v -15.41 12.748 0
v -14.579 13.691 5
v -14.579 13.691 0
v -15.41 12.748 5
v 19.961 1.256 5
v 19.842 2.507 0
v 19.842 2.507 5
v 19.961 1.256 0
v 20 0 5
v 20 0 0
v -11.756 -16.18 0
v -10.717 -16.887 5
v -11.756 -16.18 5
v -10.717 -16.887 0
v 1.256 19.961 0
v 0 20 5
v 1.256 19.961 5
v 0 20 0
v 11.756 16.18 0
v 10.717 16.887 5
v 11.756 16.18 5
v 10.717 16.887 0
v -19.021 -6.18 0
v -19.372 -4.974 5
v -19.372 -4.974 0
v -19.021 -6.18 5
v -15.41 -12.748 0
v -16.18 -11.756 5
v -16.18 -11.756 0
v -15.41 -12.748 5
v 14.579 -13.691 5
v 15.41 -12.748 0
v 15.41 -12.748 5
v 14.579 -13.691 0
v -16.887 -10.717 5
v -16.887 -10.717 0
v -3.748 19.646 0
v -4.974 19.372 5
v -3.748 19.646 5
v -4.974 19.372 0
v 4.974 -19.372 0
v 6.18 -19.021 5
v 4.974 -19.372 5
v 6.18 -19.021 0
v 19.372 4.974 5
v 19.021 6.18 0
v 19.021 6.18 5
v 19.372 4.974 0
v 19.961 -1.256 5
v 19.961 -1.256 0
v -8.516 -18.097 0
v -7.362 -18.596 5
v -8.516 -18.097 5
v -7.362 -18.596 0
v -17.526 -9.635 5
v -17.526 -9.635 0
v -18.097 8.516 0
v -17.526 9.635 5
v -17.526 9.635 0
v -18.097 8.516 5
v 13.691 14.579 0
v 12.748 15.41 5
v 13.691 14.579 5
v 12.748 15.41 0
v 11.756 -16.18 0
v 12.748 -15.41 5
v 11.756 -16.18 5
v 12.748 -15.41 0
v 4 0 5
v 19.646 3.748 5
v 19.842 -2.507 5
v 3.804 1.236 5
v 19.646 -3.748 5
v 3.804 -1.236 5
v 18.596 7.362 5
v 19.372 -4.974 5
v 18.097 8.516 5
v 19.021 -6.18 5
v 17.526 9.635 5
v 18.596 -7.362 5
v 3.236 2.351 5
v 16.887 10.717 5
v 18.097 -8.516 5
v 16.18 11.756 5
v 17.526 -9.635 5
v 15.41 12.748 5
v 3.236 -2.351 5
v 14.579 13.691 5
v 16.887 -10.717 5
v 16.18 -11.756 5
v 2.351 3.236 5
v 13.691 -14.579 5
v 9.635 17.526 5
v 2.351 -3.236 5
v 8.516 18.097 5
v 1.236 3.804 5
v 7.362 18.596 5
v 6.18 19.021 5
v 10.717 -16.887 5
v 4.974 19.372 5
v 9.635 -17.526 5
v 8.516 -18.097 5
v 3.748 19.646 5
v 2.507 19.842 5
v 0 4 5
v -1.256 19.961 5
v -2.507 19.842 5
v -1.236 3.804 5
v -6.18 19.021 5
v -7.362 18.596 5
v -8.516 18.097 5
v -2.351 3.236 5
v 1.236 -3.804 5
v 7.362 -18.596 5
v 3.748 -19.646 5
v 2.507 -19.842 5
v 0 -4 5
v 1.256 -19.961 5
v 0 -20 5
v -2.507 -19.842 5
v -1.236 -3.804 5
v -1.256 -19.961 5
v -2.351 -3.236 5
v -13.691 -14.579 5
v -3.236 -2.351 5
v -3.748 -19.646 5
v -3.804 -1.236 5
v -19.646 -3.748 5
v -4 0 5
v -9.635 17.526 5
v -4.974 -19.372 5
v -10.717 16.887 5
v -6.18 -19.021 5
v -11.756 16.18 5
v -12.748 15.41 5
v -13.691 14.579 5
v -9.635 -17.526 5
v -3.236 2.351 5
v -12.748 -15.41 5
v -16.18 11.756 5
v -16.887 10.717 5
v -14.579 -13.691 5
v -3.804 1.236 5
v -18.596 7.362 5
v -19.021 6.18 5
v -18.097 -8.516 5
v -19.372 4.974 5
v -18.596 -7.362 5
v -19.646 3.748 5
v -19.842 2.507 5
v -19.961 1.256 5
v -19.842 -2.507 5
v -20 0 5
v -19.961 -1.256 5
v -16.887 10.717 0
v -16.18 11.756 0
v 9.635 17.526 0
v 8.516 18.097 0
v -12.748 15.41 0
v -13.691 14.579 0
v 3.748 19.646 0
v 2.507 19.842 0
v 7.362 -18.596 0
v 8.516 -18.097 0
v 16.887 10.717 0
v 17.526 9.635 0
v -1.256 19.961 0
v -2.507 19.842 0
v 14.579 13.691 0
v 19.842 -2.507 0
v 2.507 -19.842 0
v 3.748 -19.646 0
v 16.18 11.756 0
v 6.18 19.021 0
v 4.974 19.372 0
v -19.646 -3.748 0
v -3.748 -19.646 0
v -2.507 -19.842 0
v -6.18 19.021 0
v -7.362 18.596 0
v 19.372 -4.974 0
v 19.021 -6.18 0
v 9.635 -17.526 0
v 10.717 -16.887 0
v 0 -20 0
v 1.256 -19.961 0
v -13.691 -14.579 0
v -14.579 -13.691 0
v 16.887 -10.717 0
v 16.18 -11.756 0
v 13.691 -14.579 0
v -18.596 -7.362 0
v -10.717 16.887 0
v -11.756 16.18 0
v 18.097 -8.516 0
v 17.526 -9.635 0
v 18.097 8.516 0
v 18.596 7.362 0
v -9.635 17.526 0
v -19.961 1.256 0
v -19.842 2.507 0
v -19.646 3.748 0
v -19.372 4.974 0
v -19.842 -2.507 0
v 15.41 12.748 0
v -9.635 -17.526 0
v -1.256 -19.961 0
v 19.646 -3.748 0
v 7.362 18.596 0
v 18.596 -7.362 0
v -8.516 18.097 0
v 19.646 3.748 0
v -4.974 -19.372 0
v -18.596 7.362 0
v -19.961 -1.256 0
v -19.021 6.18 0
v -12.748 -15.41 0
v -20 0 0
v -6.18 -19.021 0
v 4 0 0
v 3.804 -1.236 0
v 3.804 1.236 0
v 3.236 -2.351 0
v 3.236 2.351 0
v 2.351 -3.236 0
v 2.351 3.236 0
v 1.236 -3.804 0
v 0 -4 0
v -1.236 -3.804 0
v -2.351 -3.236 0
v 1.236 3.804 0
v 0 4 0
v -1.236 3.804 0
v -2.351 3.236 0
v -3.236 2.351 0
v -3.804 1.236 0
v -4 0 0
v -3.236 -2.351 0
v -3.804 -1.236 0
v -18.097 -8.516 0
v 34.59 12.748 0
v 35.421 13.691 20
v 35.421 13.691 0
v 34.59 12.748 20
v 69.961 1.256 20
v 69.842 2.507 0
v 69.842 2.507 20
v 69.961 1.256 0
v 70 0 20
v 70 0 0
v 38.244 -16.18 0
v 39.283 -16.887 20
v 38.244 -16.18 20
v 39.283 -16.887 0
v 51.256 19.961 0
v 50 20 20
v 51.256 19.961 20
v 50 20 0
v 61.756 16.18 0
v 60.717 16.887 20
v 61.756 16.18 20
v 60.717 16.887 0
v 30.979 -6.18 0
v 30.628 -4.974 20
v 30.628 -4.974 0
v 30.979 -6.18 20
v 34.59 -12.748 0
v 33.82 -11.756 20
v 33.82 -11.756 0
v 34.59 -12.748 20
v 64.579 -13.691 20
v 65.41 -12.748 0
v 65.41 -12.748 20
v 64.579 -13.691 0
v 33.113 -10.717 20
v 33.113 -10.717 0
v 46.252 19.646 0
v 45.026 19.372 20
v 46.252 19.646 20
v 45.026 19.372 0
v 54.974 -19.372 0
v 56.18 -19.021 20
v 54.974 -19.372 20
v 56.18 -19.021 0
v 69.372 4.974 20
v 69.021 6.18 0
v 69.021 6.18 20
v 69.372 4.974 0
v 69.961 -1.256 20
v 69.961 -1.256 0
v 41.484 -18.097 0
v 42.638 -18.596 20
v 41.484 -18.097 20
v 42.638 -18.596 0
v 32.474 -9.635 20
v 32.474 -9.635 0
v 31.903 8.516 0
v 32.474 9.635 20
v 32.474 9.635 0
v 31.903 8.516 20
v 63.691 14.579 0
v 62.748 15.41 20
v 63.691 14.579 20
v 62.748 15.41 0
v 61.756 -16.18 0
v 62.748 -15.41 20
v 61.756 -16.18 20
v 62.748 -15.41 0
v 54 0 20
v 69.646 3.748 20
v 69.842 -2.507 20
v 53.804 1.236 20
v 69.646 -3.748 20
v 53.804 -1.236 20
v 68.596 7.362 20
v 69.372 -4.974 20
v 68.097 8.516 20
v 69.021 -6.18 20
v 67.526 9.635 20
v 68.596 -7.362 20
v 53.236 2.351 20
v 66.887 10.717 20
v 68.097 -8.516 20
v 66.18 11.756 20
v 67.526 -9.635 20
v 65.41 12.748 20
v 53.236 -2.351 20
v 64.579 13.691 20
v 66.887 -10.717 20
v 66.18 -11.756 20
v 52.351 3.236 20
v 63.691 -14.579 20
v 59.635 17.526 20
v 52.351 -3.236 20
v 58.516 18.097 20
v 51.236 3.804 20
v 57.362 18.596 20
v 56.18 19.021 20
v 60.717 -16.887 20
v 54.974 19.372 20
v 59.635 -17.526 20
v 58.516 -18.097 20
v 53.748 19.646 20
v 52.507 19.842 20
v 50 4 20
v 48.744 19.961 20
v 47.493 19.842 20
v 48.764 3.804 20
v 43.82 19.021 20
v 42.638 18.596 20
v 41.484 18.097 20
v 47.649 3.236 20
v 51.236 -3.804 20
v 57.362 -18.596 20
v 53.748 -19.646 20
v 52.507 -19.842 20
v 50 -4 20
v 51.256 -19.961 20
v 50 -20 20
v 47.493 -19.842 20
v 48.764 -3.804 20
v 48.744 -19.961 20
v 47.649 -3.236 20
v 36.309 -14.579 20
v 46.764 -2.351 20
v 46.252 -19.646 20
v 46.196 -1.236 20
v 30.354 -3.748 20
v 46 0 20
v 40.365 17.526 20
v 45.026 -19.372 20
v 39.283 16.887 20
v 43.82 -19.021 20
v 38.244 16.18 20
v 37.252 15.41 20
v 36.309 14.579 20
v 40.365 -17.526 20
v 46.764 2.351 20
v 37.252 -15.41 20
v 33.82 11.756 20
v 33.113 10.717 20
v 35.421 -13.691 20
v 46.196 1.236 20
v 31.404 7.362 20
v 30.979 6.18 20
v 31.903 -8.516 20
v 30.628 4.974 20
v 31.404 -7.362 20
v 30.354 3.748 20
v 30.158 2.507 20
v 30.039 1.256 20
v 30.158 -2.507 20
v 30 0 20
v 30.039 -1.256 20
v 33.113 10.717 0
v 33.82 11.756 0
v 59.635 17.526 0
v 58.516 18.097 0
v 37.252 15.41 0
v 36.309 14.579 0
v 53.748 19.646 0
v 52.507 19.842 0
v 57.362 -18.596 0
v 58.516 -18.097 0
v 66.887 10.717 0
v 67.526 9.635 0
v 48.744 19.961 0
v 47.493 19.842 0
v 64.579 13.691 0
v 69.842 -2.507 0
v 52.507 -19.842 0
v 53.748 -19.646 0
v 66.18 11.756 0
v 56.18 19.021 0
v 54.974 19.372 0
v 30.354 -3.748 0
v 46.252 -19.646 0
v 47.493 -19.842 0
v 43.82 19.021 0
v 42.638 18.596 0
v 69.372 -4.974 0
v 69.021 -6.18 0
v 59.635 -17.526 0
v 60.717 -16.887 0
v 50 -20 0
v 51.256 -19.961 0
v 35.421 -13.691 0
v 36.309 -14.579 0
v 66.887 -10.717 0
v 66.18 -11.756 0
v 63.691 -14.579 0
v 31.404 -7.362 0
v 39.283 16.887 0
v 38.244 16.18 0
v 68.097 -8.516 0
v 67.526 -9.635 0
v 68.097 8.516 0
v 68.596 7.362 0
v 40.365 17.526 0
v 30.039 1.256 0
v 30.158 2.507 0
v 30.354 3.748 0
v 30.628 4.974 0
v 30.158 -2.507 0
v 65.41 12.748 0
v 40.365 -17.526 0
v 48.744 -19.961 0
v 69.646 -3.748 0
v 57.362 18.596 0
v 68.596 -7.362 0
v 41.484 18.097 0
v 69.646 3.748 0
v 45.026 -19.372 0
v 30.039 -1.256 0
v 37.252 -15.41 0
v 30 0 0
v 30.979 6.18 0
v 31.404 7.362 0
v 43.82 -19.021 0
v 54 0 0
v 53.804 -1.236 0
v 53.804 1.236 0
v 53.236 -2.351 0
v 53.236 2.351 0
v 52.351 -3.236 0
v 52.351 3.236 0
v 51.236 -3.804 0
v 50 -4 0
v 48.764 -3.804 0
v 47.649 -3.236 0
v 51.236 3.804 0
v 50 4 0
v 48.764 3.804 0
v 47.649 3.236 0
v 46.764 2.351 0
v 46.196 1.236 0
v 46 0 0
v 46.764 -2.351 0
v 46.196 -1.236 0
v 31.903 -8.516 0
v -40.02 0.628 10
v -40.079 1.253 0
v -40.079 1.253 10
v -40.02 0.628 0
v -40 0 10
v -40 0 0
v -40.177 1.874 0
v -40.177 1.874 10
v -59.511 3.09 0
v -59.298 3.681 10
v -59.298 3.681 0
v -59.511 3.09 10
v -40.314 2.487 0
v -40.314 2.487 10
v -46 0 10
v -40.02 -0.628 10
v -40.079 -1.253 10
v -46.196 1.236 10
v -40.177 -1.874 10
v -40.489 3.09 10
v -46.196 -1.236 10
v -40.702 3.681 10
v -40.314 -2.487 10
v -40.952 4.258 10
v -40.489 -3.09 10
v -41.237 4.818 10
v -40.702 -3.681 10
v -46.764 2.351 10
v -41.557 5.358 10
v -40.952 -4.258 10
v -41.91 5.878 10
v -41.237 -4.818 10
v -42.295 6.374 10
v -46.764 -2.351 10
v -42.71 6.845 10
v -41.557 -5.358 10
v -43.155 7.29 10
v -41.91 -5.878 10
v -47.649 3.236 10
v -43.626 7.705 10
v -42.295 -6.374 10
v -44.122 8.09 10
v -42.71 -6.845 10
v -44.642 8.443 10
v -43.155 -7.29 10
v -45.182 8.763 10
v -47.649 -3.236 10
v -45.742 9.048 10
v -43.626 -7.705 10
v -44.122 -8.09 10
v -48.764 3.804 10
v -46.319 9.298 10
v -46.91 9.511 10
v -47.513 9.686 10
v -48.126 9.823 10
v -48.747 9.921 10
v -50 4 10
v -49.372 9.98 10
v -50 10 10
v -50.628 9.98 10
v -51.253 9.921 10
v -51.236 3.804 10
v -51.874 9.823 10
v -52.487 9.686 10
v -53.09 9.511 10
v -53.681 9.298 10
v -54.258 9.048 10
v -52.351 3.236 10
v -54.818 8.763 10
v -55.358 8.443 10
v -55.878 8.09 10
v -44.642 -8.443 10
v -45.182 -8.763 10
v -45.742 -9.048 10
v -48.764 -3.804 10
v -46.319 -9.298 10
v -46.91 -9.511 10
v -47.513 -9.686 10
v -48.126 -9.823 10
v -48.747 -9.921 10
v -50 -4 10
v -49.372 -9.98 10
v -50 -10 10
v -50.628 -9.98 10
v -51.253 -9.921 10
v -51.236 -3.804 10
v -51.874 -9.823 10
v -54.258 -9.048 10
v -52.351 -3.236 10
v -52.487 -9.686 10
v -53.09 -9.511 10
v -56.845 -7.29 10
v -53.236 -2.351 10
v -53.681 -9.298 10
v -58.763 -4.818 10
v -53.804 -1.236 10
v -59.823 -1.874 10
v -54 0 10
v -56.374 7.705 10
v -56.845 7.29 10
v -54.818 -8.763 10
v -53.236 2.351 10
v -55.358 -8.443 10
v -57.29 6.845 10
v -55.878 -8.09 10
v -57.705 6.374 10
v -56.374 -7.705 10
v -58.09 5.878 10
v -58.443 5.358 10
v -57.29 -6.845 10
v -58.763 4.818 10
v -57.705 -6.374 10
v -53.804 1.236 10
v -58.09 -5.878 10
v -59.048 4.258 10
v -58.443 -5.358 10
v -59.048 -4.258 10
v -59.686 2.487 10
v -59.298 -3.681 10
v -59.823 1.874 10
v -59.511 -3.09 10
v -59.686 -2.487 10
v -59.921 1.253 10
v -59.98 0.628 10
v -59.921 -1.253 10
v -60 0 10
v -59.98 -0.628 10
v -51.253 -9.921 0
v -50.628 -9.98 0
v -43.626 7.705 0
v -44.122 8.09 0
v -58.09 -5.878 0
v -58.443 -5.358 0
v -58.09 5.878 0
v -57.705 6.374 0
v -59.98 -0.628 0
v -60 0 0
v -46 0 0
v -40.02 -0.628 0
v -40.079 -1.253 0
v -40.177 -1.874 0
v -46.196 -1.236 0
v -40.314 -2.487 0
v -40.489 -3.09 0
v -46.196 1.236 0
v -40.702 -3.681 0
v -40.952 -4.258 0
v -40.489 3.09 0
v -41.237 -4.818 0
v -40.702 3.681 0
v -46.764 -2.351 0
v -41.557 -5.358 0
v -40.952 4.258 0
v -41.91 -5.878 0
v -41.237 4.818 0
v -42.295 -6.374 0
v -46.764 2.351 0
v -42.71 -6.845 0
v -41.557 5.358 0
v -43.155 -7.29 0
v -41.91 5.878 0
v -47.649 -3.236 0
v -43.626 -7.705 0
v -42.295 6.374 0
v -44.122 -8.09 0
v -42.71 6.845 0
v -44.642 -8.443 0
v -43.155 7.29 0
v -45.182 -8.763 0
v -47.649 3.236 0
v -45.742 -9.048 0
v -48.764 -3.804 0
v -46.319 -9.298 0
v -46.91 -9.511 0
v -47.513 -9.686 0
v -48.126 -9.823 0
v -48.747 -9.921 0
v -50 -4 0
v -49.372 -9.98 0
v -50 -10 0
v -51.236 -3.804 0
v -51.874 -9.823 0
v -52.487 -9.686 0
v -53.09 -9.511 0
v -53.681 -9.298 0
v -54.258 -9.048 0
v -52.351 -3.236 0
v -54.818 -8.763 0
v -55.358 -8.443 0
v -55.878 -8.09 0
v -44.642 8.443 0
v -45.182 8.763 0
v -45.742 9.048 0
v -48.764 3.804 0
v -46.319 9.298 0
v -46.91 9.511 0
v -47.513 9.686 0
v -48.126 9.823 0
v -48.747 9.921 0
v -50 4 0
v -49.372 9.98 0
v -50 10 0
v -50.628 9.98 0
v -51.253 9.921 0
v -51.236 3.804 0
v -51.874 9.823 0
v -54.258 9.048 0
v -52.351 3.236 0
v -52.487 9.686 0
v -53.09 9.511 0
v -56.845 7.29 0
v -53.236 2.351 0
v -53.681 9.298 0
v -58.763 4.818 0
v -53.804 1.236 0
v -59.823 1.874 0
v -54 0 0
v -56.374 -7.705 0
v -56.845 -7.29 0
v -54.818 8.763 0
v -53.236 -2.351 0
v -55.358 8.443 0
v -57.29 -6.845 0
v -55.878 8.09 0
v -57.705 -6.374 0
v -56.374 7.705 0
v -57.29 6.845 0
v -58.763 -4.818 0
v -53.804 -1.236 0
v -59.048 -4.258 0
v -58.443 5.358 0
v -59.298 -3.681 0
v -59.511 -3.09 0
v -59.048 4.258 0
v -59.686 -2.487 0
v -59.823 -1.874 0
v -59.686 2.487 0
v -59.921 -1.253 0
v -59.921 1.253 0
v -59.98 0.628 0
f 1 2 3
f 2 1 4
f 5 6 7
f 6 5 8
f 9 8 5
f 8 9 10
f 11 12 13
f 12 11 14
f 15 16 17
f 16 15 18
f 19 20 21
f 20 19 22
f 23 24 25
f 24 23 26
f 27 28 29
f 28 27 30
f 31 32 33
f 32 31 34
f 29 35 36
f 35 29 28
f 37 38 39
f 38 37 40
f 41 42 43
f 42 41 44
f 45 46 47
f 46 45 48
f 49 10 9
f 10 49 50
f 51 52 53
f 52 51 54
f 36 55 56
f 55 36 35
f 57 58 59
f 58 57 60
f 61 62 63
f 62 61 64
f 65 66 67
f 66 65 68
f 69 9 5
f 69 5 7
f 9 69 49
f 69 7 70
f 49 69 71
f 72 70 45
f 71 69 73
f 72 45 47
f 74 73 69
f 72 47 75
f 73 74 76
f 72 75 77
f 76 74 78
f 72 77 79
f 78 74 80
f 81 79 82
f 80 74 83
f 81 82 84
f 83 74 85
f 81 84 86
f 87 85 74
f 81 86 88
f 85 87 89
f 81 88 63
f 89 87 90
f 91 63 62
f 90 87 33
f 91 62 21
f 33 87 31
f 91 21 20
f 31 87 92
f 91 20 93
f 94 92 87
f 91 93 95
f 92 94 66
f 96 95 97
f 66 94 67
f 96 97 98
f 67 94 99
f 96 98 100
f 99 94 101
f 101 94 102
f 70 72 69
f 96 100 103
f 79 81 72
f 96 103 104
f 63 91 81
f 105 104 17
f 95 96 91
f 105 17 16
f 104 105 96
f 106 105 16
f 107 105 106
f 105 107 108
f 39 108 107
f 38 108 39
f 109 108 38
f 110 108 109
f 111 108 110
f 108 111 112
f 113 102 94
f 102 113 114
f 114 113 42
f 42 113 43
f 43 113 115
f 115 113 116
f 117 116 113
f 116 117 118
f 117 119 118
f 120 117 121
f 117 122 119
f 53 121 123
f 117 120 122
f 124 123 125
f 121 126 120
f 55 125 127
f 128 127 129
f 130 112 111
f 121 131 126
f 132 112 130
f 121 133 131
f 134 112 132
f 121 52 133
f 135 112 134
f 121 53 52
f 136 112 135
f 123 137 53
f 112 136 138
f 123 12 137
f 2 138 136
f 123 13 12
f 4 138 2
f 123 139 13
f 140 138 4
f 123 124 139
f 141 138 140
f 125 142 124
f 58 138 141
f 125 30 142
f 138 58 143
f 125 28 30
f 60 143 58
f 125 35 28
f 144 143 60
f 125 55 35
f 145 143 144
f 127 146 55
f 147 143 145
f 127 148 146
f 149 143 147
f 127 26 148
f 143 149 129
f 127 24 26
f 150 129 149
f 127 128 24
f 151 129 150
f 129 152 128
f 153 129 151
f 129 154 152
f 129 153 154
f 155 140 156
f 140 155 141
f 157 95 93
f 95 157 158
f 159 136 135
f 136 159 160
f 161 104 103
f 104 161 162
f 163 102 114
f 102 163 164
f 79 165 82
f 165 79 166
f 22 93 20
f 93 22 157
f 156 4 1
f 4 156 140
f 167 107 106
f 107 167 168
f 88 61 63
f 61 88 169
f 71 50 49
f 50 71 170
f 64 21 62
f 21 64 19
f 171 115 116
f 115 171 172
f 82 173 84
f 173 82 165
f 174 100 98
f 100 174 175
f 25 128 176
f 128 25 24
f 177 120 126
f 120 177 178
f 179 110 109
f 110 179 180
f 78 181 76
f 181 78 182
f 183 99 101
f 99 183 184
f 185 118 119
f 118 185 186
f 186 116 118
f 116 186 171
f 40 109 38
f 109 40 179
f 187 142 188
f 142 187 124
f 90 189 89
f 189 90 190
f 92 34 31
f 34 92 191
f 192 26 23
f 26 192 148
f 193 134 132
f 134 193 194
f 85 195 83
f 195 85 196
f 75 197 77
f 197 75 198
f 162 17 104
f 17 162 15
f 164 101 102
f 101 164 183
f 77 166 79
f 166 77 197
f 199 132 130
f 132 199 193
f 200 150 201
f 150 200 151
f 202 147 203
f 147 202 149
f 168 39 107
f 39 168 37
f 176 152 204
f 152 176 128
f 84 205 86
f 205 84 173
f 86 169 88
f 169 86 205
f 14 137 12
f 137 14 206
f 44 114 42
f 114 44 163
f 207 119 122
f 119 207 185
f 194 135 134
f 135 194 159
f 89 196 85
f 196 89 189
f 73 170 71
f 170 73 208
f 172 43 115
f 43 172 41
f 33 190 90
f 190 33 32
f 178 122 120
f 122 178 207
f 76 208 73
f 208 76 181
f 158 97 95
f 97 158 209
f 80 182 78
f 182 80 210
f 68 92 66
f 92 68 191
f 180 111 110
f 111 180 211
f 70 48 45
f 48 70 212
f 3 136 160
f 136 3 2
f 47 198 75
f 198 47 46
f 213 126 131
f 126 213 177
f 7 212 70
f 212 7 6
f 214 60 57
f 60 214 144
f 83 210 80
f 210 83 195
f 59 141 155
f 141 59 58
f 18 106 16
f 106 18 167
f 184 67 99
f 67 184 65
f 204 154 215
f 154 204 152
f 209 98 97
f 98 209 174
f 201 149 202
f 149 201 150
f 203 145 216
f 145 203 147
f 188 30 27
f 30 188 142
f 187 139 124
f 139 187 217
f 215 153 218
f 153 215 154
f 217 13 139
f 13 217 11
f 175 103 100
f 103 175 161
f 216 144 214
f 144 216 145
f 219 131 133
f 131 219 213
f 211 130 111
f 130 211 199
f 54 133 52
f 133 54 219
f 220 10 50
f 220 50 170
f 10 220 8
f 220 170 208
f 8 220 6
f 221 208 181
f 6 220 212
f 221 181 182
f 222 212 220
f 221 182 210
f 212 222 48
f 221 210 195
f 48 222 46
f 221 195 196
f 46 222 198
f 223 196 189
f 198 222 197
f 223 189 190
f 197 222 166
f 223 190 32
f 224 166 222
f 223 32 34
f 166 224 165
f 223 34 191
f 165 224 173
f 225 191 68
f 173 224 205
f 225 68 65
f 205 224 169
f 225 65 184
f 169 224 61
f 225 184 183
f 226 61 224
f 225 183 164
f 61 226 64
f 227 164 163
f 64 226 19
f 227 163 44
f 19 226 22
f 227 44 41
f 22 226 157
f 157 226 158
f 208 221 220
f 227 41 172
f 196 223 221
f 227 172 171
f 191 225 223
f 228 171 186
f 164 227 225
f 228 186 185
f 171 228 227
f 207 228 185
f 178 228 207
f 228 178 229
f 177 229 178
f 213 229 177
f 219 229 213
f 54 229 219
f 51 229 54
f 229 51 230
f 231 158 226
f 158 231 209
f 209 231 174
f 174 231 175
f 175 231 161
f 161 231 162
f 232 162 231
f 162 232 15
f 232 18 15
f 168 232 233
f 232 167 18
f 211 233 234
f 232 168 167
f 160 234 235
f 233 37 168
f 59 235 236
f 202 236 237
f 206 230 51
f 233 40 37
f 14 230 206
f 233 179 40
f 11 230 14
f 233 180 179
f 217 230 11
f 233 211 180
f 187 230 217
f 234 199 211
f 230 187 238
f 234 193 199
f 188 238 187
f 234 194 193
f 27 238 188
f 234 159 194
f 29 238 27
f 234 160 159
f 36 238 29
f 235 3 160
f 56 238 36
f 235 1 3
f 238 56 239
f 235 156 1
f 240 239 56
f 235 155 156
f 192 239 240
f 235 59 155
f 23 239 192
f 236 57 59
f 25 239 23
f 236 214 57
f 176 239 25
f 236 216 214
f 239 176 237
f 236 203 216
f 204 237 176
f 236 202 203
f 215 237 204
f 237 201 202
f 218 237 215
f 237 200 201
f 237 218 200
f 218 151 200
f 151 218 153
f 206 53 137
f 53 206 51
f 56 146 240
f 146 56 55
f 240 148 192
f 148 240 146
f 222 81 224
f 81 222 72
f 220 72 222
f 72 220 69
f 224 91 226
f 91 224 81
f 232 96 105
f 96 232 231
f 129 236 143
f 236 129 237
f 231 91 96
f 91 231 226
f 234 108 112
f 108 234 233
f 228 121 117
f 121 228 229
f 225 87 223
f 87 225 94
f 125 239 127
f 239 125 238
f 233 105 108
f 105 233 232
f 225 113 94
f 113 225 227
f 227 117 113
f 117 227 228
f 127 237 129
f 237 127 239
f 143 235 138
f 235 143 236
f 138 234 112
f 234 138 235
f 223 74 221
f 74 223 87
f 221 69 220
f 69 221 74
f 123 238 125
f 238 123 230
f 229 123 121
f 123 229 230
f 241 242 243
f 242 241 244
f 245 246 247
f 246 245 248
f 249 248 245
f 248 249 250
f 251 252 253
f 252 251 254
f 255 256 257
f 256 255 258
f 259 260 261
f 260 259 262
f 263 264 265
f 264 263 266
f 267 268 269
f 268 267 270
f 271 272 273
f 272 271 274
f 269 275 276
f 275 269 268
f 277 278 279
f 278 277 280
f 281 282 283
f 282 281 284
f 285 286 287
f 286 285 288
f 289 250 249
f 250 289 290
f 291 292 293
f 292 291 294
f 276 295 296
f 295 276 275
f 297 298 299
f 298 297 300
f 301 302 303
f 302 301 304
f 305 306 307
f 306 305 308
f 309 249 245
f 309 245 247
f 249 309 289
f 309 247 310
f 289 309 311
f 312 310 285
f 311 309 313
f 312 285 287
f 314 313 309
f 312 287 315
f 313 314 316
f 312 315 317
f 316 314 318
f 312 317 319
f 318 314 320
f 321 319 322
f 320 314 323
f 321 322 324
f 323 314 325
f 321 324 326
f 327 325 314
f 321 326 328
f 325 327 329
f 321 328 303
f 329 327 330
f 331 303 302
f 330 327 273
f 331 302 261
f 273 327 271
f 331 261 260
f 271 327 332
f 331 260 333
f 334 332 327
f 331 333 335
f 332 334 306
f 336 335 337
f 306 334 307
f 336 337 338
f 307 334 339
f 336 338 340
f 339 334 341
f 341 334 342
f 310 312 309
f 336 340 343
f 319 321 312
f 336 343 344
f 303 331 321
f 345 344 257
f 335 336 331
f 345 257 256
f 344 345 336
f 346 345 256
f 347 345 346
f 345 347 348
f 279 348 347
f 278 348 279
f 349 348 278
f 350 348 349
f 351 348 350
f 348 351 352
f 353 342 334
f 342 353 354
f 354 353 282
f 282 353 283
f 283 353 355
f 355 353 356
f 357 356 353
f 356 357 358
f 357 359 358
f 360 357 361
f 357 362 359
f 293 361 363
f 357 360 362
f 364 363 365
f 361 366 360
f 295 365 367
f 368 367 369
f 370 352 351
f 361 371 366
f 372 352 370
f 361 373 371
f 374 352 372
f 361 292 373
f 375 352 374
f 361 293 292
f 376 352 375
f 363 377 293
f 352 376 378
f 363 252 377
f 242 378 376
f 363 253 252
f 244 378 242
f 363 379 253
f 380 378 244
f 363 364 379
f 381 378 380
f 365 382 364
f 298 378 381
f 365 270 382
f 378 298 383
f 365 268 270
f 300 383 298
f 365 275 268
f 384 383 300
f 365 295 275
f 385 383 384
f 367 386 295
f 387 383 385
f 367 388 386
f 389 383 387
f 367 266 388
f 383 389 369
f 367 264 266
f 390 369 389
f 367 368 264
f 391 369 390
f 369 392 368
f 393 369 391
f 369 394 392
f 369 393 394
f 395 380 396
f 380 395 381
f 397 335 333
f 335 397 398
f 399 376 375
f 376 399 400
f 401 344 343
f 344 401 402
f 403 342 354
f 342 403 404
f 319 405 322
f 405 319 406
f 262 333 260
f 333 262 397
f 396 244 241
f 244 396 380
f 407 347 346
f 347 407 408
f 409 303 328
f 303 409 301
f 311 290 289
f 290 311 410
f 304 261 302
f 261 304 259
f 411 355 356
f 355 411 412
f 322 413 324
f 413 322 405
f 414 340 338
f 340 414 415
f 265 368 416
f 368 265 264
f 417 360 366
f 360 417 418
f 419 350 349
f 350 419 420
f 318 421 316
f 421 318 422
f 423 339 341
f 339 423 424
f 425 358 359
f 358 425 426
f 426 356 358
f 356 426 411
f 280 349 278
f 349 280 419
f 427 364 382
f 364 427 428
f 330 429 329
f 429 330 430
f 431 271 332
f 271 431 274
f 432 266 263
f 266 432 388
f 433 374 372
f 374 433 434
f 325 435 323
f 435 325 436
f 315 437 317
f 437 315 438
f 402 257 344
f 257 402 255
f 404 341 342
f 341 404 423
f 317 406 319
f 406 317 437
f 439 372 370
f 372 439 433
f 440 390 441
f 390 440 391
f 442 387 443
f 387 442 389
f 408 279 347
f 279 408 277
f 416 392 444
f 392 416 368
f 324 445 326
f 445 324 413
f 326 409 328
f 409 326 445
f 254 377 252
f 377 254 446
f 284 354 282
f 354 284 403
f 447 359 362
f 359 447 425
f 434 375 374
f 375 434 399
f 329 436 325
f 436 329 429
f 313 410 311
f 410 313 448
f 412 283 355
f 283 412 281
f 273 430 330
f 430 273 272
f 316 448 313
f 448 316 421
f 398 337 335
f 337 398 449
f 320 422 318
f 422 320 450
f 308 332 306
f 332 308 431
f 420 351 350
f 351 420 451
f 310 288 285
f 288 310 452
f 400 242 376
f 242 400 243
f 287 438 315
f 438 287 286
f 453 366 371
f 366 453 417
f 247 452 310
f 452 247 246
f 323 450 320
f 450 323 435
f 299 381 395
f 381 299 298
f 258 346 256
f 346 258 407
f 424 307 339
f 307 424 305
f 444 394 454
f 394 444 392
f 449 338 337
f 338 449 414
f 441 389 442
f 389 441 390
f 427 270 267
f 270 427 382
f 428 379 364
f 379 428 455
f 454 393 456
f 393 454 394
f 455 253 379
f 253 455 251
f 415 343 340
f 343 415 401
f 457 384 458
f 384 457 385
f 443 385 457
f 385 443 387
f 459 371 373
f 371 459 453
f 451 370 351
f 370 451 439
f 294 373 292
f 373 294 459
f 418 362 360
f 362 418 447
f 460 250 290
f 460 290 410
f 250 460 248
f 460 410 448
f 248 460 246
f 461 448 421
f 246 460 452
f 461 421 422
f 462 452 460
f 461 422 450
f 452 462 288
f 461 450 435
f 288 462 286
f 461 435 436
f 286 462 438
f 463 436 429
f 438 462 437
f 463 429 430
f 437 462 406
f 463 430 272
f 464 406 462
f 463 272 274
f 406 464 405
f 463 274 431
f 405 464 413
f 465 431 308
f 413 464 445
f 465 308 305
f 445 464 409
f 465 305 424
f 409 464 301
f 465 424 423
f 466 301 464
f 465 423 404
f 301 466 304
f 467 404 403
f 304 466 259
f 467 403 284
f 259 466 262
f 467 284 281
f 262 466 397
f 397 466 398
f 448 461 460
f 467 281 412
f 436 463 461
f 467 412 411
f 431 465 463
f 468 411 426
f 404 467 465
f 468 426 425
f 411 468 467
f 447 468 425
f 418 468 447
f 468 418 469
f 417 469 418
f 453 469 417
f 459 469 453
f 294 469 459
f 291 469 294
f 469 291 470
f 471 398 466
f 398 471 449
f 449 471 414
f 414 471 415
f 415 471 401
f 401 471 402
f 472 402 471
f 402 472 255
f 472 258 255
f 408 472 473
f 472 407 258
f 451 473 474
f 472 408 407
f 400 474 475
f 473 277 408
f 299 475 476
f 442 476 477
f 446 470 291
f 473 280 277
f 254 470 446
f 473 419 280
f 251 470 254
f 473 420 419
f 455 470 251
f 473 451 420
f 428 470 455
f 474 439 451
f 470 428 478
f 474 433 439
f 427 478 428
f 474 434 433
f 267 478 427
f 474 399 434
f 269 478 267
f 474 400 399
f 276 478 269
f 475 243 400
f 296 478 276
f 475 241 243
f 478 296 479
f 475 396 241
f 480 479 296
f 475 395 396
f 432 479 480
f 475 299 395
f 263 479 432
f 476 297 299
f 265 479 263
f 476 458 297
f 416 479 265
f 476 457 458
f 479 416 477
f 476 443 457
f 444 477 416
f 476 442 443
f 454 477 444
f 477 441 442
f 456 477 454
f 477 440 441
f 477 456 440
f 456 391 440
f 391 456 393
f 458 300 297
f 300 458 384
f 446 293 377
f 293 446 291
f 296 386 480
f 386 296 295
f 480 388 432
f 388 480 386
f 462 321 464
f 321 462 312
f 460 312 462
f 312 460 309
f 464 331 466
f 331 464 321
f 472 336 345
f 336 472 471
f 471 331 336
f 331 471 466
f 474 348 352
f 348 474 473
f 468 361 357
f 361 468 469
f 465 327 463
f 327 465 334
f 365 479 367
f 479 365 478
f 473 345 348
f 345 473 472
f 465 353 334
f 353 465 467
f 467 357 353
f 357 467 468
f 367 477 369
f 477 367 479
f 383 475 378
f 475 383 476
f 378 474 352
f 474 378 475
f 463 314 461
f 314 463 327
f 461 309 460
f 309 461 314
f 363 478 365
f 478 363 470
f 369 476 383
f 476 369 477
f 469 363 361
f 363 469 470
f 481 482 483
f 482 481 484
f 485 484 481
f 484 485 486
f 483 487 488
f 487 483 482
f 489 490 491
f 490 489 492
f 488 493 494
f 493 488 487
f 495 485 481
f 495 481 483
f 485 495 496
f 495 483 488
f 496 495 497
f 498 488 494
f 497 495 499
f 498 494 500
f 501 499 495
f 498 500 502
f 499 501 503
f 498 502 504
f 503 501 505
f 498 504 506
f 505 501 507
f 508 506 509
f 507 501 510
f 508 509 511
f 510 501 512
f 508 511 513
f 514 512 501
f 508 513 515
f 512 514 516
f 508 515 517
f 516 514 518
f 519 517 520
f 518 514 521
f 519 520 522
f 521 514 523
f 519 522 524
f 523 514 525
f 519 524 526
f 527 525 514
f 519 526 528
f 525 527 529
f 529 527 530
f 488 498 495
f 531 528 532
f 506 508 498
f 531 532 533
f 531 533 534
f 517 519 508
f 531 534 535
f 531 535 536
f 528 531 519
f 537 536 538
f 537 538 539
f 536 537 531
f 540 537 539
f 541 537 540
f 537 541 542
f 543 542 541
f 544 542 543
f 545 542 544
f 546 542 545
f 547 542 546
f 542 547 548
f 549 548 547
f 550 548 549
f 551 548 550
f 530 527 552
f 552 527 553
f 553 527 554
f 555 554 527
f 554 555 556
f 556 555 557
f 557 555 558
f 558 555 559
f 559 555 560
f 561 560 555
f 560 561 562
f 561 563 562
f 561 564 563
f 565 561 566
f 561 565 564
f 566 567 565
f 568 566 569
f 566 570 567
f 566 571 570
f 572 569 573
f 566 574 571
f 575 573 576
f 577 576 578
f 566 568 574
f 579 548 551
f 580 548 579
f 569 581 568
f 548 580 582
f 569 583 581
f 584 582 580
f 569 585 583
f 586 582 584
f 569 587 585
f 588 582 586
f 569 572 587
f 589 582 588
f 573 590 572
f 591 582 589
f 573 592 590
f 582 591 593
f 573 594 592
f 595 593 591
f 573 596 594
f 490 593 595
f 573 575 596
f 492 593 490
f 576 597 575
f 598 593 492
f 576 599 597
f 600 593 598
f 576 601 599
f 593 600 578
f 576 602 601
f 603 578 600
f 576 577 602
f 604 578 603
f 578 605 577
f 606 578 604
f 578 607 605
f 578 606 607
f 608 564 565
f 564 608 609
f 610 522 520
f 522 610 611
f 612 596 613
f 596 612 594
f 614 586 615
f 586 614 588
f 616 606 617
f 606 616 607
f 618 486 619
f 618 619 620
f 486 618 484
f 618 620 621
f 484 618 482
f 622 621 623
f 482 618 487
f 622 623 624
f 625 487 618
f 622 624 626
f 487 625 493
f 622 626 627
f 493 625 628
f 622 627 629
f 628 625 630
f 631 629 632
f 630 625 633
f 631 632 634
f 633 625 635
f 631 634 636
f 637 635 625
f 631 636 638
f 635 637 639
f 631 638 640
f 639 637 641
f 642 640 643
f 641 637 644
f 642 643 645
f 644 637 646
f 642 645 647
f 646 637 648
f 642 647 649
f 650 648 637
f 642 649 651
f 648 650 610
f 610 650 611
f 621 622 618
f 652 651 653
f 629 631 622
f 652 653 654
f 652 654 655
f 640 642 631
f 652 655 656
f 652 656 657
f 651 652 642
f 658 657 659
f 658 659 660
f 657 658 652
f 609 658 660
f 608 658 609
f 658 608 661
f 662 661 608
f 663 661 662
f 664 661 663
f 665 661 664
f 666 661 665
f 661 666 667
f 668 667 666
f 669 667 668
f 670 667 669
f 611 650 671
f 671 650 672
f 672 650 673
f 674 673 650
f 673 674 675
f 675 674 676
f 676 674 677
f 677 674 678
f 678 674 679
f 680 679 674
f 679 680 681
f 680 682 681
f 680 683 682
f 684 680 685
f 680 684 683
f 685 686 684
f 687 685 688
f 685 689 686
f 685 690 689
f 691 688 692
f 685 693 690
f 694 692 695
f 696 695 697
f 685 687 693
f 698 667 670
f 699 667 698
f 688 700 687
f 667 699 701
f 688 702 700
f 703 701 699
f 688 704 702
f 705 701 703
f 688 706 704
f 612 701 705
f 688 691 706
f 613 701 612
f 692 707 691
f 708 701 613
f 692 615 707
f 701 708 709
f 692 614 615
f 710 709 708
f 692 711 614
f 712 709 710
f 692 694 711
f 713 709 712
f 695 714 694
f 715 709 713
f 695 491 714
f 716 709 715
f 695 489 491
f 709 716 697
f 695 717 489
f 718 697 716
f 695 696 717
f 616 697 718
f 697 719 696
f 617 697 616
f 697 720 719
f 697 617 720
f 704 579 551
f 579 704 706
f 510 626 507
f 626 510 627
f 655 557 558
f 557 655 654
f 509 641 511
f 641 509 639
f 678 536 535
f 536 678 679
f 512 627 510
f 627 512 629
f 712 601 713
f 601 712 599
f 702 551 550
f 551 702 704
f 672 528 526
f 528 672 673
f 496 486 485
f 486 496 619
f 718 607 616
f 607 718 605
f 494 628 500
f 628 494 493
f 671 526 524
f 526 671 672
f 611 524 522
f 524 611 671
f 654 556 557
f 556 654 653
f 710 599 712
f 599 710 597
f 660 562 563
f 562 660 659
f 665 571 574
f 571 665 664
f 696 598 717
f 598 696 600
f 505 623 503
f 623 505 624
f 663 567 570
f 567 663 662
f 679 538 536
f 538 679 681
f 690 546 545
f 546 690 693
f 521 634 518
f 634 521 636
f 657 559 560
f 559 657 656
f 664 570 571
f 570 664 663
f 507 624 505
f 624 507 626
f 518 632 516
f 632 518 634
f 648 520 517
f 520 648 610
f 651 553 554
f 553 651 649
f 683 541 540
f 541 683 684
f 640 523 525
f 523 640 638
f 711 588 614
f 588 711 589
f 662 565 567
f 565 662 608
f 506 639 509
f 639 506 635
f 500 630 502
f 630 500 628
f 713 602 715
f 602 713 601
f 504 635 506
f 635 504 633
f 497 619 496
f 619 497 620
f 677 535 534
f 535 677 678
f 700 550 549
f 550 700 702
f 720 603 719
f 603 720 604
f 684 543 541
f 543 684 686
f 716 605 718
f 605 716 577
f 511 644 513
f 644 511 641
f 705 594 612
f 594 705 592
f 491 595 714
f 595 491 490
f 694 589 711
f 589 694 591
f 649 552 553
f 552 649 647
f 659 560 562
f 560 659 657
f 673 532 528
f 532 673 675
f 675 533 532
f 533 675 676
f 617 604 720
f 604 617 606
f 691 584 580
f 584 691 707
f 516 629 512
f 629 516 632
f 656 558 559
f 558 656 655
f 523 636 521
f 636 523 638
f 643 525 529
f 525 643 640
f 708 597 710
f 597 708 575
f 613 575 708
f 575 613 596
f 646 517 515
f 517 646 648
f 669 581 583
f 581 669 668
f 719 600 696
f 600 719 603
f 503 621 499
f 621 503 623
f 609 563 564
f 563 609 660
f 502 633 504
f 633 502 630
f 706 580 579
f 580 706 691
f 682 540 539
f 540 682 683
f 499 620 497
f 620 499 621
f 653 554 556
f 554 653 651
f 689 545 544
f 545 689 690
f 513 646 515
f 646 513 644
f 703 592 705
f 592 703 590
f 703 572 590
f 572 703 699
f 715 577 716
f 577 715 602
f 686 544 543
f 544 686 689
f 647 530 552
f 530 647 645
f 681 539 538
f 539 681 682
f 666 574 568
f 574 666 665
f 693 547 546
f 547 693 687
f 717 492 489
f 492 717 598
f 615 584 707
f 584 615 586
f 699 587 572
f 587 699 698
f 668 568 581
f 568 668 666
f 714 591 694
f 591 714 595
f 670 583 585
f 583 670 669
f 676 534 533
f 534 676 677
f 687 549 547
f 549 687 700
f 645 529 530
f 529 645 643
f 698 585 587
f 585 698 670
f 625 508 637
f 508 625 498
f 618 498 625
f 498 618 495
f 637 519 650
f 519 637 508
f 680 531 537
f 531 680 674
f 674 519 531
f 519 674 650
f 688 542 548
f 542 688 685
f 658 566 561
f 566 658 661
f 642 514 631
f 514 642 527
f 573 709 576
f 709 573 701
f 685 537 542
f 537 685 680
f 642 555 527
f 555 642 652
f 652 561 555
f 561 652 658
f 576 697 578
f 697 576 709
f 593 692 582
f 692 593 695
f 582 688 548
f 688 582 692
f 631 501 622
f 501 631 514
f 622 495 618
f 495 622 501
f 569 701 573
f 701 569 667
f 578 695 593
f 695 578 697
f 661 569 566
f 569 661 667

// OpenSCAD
// file: utils/build_plate.scad
// Build Plate representation module
// Made by Makerbot (http://curriculum.makerbot.com/daily_lessons/february/openscad_buildplate.html)

//use this to include a build plate visualization in your openSCAD scripts. Very useful for things designed to be edited in Makerbot Customizer

//to use, either include or use <utils/build_plate.scad>

//then just call build_plate(); with the following arguments (also, you have to have a real object in your scene for this to render)

//putting 0 as the first argument will give you a Replicator 2 build plate
//putting 1 as the first argument will give you a Replicator 1 build plate
//putting 2 as the first argument will give you a Thingomatic build plate
//putting 3 as the first argument will give you a manually adjustable build plate (note: if you use this option, you need to specify your build plates X length (in mm) as the second argument and the Y length (in mm) as the third argument. eg. build_plate(3,150,120);)

/*

to give your user control of which build plate they see in Customizer, include the following code:

use <utils/build_plate.scad>

//for display only, doesn't contribute to final object
build_plate_selector = 0; //[0:Replicator 2,1: Replicator,2:Thingomatic,3:Manual]
//when Build Plate Selector is set to "manual" this controls the build plate x dimension
build_plate_manual_x = 100; //[100:400]
//when Build Plate Selector is set to "manual" this controls the build plate y dimension
build_plate_manual_y = 100; //[100:400]

build_plate(build_plate_selector,build_plate_manual_x,build_plate_manual_y);

*/




//to see how this works, uncomment the following code

//build_plate_selector = 0; //[0:Replicator 2,1: Replicator,2:Thingomatic,3:Manual]
//build_plate_manual_x = 100; //[100:400]
//build_plate_manual_y = 100; //[100:400]
//
//build_plate(build_plate_selector,build_plate_manual_x,build_plate_manual_y);
//
//cube(5);


module build_plate(bp,manX,manY){

		translate([0,0,-.52]){
			if(bp == 0){
				%cube([285,153,1],center = true);
			}
			if(bp == 1){
				%cube([225,145,1],center = true);
			}
			if(bp == 2){
				%cube([120,120,1],center = true);
			}
			if(bp == 3){
				%cube([manX,manY,1],center = true);
			}
		
		}
		translate([0,0,-.5]){
			if(bp == 0){
				for(i = [-14:14]){
					translate([i*10,0,0])
					%cube([.5,153,1.01],center = true);
				}
				for(i = [-7:7]){
					translate([0,i*10,0])
					%cube([285,.5,1.01],center = true);
				}	
			}
			if(bp == 1){
				for(i = [-11:11]){
					translate([i*10,0,0])
						%cube([.5,145,1.01],center = true);
				}
				for(i = [-7:7]){
					translate([0,i*10,0])
						%cube([225,.5,1.01],center = true);
				}
			}
			if(bp == 2){
				for(i = [-6:6]){
					translate([i*10,0,0])
						%cube([.5,120,1.01],center = true);
				}
				for(i = [-6:6]){
					translate([0,i*10,0])
						%cube([120,.5,1.01],center = true);
				}
			}
			if(bp == 3){
				for(i = [-(floor(manX/20)):floor(manX/20)]){
					translate([i*10,0,0])
						%cube([.5,manY,1.01],center = true);
				}
				for(i = [-(floor(manY/20)):floor(manY/20)]){
					translate([0,i*10,0])
						%cube([manX,.5,1.01],center = true);
				}
			}
		}
}
// main file
use <./utils/build_plate.scad> // Cuadricula transparente para la base
build_plate(3, 200,100); // No se incluye al renderizar


//----------------------------------------------------------
//-- Tutorial OpenScad
//-- Juan Gonzalez-Gomez (Obijuan) juan@iearobotics.com
//----------------------------------------------------------
//-- (c) Mayo, 2012
//-- Licencia GPL
//----------------------------------------------------------
//-- Rueda modularizada con parametros por defecto
//----------------------------------------------------------

module rueda_simple(grosor=5, diametro=40, diam_eje=8)
{
  //-- Construcción de la rueda a partir de
  //-- los parámetros
  difference() {
    //-- Base de la rueda
    cylinder(r=diametro/2, h=grosor,$fn=100);

    //-- Taladro del eje
    cylinder(r=diam_eje/2, h=3*grosor,$fn=20,center=true);
  }
}

//-- Ejemplos de utilizacion
rueda_simple();

translate([50,0,0])
   rueda_simple(grosor=20);

translate([-50,0,0])
  rueda_simple(diametro=20, grosor=10);
